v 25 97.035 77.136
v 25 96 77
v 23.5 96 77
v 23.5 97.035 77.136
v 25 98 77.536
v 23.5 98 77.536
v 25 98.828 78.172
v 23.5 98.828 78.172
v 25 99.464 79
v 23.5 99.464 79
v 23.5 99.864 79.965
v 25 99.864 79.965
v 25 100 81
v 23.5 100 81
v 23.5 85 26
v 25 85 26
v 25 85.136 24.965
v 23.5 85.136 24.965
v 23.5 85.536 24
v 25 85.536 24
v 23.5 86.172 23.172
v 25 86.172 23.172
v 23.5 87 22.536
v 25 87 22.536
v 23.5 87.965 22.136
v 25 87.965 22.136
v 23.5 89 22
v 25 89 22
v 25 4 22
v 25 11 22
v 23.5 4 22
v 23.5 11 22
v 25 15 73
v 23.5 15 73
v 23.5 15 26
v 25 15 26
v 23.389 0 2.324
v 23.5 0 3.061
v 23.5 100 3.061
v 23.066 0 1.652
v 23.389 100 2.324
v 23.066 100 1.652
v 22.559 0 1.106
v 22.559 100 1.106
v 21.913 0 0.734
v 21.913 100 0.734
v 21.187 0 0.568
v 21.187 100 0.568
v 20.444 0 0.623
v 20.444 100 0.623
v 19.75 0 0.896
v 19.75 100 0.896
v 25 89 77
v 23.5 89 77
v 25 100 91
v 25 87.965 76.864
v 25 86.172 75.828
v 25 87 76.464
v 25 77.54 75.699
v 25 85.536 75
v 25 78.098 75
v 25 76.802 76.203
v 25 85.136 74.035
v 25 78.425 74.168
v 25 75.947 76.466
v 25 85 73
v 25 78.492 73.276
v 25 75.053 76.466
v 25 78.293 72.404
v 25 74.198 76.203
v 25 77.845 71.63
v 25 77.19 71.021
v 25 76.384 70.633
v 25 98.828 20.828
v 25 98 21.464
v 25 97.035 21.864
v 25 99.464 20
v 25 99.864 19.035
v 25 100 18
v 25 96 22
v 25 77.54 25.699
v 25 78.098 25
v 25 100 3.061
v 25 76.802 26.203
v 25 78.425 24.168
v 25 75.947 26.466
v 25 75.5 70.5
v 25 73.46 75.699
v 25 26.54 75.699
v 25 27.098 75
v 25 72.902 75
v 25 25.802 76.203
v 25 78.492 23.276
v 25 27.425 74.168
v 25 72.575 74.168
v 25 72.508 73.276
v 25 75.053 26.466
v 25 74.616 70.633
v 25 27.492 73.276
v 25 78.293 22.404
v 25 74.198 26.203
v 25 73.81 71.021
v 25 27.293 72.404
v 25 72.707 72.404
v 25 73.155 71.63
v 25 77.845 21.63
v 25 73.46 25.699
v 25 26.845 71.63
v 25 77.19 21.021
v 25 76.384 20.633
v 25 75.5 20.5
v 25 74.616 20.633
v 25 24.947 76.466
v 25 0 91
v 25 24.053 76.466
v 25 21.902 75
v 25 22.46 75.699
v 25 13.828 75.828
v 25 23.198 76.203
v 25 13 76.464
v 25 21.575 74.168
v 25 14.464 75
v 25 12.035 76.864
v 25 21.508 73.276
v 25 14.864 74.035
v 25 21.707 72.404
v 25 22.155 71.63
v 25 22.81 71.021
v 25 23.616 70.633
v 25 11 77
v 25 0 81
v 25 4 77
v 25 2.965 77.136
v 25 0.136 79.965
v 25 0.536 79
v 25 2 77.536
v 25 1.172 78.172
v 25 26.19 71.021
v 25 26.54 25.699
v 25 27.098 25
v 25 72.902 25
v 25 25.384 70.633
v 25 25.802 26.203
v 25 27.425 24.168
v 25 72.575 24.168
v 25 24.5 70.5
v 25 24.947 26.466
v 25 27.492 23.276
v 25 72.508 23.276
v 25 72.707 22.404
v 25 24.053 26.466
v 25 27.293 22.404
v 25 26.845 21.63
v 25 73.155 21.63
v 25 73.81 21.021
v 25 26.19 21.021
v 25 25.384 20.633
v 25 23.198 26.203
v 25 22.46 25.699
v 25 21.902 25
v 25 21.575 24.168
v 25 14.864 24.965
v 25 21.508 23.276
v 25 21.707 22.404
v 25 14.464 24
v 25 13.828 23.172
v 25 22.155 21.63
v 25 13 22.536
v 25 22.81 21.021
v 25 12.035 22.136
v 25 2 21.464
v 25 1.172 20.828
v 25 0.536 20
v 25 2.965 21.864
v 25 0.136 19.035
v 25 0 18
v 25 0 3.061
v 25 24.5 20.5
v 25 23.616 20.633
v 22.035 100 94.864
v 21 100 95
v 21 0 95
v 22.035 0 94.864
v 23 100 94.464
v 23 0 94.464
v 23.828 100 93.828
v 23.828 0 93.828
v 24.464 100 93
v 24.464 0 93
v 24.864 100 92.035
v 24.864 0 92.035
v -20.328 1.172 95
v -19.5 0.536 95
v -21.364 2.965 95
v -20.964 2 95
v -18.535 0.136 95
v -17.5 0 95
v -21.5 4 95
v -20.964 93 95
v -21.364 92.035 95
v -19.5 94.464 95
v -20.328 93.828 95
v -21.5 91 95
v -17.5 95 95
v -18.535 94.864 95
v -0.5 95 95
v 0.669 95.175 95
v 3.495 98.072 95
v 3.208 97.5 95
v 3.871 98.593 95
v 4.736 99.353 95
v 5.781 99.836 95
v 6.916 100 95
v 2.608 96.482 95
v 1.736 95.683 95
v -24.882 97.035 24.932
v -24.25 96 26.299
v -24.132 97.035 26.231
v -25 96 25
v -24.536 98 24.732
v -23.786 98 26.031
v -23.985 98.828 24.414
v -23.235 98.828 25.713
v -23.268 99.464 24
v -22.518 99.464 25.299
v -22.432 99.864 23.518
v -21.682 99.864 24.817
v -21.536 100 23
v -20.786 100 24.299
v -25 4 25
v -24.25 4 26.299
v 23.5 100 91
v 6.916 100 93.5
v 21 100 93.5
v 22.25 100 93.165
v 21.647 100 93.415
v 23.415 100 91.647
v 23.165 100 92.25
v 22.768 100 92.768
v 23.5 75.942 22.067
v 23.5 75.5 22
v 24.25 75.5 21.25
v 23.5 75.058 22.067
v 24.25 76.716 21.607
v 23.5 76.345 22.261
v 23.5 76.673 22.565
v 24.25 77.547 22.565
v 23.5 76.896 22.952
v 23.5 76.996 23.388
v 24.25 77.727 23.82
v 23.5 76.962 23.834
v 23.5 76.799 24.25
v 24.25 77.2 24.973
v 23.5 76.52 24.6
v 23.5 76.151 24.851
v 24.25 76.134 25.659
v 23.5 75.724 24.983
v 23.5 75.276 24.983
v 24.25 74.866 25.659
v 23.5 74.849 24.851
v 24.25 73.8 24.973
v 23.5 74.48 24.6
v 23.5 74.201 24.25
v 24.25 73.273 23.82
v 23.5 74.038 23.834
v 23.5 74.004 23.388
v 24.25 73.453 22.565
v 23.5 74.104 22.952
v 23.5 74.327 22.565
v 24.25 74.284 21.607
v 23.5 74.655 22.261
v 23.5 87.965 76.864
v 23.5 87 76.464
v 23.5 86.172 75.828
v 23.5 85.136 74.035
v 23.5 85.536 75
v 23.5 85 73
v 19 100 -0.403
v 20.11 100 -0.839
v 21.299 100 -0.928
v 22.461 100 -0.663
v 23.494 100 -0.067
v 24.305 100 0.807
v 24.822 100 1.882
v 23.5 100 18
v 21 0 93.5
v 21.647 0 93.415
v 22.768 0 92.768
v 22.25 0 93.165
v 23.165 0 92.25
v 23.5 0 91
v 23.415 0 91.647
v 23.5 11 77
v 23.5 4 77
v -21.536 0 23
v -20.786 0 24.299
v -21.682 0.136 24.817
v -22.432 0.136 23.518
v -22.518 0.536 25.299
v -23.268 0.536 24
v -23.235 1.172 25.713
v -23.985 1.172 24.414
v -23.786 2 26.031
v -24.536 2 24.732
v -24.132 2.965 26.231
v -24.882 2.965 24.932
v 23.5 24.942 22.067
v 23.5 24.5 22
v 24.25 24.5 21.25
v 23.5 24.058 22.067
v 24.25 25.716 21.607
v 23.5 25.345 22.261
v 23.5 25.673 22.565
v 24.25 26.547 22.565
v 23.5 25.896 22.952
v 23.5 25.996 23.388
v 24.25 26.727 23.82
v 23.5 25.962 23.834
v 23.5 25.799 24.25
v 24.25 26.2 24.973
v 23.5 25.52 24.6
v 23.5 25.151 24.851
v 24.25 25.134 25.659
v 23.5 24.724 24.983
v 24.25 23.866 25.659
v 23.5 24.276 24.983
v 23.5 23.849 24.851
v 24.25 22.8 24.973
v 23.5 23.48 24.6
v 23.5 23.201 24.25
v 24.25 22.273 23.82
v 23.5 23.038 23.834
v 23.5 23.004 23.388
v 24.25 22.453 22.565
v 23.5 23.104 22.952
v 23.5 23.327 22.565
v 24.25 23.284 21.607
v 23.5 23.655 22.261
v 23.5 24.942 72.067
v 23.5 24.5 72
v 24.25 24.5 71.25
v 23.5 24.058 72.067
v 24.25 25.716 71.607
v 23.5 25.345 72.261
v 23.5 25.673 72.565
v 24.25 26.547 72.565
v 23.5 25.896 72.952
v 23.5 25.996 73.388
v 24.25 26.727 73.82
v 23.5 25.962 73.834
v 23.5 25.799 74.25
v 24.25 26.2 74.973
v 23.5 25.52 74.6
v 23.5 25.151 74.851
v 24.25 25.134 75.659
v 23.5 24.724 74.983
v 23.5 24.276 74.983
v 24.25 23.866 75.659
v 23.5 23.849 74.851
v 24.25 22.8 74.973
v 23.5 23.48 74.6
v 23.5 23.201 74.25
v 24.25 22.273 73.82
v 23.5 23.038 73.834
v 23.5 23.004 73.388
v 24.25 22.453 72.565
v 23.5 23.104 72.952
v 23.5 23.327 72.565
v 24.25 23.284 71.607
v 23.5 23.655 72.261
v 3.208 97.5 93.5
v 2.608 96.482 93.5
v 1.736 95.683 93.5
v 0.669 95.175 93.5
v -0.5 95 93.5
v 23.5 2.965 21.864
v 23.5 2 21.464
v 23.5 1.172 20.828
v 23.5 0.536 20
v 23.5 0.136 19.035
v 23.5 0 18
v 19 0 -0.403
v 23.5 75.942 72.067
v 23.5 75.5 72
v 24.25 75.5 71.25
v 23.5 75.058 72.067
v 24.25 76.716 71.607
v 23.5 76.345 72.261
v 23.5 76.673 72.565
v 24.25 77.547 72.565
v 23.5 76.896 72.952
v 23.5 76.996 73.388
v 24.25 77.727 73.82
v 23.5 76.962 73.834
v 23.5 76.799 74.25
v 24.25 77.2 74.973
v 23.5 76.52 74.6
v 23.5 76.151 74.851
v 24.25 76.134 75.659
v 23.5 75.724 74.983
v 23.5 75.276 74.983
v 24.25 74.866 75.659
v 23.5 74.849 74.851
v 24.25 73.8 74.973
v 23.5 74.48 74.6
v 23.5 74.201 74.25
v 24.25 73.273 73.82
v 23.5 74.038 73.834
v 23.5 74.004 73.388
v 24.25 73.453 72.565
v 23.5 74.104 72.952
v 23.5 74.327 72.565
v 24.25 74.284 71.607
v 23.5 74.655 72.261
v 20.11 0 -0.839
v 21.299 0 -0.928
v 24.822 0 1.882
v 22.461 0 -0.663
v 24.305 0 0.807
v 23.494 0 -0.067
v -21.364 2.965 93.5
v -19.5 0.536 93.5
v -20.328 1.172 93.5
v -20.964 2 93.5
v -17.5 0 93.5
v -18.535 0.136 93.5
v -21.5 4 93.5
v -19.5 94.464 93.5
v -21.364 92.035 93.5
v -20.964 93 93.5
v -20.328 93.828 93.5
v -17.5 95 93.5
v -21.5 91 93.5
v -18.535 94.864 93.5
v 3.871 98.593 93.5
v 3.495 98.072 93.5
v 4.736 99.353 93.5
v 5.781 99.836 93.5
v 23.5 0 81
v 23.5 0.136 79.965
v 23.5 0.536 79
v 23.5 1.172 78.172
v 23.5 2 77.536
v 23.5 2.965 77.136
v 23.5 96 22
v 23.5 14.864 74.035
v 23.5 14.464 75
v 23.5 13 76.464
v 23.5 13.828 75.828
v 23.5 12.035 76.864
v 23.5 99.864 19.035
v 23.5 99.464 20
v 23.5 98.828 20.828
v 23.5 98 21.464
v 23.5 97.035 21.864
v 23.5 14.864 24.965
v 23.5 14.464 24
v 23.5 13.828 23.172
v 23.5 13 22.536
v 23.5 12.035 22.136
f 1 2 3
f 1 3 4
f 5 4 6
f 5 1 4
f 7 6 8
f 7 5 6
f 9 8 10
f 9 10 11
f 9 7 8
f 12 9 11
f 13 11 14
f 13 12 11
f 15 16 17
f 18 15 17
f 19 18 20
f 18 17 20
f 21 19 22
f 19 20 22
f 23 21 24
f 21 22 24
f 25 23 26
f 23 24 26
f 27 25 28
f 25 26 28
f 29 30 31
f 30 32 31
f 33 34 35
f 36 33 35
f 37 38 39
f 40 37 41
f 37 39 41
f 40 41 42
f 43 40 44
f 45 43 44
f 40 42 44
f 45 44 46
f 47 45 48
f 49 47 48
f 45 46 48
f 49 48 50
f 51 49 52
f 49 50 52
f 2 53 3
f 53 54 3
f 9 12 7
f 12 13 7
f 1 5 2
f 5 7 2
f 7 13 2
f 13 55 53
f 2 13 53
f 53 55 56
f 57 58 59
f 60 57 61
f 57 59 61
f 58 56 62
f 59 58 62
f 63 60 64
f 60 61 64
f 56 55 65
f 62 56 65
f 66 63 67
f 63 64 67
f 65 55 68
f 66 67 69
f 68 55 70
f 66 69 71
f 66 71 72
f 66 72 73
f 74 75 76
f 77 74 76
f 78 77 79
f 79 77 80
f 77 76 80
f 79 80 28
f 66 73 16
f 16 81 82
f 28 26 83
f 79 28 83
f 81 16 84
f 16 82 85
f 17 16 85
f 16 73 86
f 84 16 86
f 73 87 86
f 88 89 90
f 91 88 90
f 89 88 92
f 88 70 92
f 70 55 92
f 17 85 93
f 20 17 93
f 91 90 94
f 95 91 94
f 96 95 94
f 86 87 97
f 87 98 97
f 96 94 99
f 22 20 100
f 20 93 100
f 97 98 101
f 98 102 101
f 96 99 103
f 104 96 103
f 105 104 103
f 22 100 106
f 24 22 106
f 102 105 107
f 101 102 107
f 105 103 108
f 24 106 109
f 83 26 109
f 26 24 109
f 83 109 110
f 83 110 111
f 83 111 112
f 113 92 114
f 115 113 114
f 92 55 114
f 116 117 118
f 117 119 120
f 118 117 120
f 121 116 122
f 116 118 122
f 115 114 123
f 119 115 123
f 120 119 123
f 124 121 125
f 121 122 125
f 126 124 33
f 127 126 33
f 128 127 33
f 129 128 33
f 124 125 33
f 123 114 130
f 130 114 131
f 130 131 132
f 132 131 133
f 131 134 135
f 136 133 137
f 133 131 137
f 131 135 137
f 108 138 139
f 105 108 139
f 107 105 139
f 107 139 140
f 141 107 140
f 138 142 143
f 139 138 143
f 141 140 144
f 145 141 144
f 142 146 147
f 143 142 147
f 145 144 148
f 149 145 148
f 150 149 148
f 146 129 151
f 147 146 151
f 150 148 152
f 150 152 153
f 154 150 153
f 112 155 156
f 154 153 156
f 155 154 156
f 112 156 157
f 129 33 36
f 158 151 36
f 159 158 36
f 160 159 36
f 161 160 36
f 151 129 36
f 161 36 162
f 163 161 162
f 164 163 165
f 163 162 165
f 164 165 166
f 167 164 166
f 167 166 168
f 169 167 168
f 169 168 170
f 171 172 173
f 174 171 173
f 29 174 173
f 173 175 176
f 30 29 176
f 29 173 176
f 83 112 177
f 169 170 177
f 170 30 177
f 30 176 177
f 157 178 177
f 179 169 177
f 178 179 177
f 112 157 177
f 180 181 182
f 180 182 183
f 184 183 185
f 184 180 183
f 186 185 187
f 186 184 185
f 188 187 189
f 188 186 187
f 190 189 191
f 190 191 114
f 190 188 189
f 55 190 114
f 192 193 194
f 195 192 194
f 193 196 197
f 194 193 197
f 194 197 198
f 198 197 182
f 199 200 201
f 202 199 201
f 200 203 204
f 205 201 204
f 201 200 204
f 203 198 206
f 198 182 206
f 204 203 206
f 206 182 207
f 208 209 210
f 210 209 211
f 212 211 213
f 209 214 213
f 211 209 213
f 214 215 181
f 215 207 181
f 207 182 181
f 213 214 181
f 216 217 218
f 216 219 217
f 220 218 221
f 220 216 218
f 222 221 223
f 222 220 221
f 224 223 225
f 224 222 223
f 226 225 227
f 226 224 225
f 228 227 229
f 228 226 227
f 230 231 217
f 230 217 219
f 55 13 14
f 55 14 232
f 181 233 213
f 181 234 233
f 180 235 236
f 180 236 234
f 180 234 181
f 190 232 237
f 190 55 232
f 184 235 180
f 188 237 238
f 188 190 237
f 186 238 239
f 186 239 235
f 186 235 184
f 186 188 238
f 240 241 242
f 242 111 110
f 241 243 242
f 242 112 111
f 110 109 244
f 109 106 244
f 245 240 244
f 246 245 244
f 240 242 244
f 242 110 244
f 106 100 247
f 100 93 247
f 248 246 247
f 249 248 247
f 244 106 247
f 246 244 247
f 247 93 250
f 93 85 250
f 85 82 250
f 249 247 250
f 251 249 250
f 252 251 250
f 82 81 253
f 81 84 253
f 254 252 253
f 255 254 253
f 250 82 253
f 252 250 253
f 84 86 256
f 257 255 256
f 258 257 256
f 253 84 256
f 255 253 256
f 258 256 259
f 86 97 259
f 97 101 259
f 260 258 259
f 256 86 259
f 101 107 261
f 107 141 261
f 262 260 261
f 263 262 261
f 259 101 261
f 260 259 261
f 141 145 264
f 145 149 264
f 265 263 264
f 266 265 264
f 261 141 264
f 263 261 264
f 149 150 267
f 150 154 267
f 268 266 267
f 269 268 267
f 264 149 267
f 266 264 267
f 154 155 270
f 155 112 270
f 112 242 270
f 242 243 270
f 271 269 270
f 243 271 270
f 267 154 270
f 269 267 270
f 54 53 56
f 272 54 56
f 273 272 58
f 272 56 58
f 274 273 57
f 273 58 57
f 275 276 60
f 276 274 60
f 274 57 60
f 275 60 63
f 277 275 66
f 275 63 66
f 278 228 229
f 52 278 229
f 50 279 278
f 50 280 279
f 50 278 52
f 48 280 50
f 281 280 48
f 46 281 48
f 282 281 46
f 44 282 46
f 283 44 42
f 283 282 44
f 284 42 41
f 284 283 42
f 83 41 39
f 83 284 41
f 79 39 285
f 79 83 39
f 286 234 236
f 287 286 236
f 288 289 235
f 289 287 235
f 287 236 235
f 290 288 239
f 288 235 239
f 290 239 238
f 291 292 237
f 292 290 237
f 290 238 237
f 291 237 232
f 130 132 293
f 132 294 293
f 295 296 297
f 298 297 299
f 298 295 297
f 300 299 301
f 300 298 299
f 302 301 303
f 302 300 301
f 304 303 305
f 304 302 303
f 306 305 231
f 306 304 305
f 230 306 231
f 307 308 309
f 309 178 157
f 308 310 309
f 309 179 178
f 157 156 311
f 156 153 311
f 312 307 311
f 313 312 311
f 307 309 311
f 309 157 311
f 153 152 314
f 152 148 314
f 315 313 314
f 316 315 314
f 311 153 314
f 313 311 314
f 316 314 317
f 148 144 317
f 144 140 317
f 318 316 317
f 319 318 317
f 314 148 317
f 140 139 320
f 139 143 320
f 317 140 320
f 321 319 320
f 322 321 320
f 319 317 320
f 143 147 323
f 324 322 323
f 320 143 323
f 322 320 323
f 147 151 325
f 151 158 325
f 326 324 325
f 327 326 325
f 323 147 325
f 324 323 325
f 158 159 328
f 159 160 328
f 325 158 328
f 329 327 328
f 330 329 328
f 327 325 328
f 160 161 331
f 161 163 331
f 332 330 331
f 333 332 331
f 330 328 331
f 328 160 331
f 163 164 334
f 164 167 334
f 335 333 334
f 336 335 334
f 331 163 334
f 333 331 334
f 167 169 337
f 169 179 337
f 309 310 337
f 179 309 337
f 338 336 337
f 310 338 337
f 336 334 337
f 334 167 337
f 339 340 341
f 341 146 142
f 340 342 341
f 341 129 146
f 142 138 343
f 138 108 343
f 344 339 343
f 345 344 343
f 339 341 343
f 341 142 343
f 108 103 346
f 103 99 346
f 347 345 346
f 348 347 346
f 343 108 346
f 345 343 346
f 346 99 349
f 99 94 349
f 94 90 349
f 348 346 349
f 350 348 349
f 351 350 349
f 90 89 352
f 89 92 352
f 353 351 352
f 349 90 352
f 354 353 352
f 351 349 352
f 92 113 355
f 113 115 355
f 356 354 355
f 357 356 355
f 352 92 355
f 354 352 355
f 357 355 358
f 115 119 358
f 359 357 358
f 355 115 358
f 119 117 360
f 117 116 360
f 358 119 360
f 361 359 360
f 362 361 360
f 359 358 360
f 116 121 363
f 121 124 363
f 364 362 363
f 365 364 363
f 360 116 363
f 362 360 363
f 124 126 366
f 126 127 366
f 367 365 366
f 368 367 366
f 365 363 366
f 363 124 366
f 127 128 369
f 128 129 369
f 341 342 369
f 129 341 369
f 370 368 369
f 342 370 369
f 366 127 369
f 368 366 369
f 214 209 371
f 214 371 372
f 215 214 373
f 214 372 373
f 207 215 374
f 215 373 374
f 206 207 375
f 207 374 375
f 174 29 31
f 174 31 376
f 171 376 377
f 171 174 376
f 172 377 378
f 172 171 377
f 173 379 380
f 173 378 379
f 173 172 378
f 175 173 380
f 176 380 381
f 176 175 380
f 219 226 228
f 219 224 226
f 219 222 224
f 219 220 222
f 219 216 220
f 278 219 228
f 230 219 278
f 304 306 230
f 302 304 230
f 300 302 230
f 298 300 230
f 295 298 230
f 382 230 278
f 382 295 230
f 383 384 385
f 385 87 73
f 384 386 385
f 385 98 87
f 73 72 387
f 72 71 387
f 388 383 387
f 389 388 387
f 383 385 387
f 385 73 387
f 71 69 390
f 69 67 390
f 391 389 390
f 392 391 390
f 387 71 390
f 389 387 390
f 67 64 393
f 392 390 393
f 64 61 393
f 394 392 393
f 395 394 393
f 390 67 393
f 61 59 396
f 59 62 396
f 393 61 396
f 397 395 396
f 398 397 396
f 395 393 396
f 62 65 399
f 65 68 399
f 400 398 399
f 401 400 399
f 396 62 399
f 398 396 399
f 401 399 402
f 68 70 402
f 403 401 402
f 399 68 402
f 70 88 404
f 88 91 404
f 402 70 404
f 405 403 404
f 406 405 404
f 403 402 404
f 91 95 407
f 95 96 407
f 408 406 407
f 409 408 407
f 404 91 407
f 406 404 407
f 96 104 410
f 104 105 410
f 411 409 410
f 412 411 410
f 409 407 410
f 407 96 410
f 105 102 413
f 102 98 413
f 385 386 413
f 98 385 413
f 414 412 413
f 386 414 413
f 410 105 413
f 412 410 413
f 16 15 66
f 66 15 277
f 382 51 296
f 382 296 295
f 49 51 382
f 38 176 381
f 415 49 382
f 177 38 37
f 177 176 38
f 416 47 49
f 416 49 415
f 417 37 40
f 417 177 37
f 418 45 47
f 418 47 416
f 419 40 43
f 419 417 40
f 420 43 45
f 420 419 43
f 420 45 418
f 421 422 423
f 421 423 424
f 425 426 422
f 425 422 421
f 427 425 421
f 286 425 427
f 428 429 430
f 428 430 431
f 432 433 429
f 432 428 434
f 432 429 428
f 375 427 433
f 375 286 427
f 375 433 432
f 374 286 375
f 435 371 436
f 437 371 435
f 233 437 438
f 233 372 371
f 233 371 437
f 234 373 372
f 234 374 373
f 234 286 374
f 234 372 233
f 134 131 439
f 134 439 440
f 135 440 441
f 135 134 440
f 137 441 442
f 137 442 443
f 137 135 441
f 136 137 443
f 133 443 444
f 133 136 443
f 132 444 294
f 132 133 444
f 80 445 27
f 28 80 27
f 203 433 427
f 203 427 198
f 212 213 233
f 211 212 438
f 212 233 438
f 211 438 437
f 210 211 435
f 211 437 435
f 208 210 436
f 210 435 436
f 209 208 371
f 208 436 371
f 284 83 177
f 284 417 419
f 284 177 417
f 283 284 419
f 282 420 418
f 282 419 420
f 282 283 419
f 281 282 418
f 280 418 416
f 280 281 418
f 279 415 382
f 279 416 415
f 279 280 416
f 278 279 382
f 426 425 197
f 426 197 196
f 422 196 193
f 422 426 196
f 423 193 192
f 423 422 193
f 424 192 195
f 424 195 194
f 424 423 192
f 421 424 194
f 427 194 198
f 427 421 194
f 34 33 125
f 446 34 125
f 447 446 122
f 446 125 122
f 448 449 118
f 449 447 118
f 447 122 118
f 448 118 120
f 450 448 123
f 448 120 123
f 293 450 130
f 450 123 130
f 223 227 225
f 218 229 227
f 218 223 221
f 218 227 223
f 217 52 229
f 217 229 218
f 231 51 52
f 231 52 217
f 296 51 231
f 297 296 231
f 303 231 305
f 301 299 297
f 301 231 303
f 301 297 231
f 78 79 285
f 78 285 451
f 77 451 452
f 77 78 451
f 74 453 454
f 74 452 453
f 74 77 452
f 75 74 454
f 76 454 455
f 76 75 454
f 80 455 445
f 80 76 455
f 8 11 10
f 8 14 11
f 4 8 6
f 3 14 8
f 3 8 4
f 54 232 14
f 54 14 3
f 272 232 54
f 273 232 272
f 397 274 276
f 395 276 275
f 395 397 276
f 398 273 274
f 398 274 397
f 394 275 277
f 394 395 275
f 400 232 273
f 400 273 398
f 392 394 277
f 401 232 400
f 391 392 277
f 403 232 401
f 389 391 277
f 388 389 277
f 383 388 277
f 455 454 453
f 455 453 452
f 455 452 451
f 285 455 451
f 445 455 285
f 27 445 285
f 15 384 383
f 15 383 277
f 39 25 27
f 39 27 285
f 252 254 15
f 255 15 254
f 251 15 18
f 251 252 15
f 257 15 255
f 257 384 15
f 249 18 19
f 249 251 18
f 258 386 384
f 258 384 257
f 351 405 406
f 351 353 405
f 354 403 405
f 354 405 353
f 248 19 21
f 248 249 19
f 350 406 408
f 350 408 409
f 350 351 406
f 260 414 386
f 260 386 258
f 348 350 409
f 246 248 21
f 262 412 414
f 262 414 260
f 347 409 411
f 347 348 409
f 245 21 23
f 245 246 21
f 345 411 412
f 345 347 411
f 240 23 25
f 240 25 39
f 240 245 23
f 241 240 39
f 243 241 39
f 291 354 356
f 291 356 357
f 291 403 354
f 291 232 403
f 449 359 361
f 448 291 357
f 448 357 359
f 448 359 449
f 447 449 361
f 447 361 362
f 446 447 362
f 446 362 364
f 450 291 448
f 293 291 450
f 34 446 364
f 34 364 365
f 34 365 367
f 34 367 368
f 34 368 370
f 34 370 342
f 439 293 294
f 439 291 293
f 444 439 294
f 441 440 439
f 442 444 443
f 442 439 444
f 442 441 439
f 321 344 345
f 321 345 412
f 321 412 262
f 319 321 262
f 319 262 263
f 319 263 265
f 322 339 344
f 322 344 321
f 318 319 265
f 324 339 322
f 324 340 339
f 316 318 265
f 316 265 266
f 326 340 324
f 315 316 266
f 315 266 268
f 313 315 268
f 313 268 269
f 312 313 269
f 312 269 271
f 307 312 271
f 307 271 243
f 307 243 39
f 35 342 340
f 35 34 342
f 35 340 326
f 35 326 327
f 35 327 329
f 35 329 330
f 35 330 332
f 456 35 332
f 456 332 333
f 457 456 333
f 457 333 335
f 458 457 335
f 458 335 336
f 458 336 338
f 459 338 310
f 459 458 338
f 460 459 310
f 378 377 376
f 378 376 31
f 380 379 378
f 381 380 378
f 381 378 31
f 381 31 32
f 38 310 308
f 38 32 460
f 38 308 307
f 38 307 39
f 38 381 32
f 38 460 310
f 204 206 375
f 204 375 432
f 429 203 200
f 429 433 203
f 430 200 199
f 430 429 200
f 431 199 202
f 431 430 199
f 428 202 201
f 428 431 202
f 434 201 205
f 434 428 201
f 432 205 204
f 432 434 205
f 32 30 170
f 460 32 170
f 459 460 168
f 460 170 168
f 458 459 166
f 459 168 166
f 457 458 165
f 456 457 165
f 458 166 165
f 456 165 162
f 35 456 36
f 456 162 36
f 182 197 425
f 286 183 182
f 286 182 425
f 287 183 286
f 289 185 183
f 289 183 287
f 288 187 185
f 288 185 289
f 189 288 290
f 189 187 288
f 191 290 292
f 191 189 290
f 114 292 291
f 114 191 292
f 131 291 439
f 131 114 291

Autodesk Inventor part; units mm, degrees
ref_plane "YZ Plane" through (0, 0, 0) normal (1, 0, 0) x (0, 1, 0)
ref_plane "XZ Plane" through (0, 0, 0) normal (0, 1, 0) x (-1, 0, 0)
ref_plane "XY Plane" through (0, 0, 0) normal (0, 0, 1) x (1, 0, 0)
sketch "Sketch2" plane through (0, 0, 0) normal (0, 1, 0) x (-1, 0, 0)
  line L0 (-23.5, 25.6213) -> (-23.5, 95)
  line L1 (-23.5, 95) -> (-25, 95)
  line L2 (-25, 95) -> (-25, 25)
  line L3 (-25, 25) -> (0, 0)
  line L4 (0, 0) -> (25, 25)
  line L5 (23.5, 25.6213) -> (0, 2.1213)
  line L6 (0, 2.1213) -> (-23.5, 25.6213)
  line L7 (23.5, 25.6213) -> (25, 25)
  line L8 (25, 25) -> (-25, -3.8675)
  line L9 (-25, -3.8675) -> (-25, 25)
  line L10 (-23.5, 25.6213) -> (-23.5, -1.2694)
  line L11 (-23.5, -1.2694) -> (24.25, 26.299)
  line L12 (24.25, 26.299) -> (25, 25)
  point P0 (24.5092, 24.5092)
  dimension "d11" = 1.5
  dimension "d18" = 1.5
  dimension "d19" = 1.5
  dimension "d27" = 70
  dimension "d28" = 50
  dimension "d29" = 135
  dimension "d47" = 60
  dimension "d48" = 1.5
extrude "Extrusion2" add sketch "Sketch2" along normal blind 100 contours L10 L3 L2 L1 L0 | L11 L12 L7 L5 L8 L6 | L6 L8 L3 L11 | L10 L11 L3 L8 L9 | L5 L7 L8
fillet "Fillet3" radius 2.5 1 edges at (23.5, 50, -1.2694)
sketch "Sketch7" plane through (23.5, 0, 95) normal (-1, 0, 0) x (0, 0, 1)
  line L0 (0, 0) -> (0, 100) projected
  line L1 (0, 0) -> (-1.5, 0)
  line L2 (-1.5, 0) -> (-1.5, 100)
  line L3 (-1.5, 100) -> (0, 100)
  line L4 (0, 100) -> (0, 0)
  line L5 (-91.9393, 100) -> (0, 100) projected
  point P0 (-95, 0)
  dimension "d49" = 1.5
extrude "Extrusion7" add sketch "Sketch7" along normal blind 45
fillet "Fillet12" radius 4 2 edges at (25, 50, 95) (25, 50, -3.8675)
fillet "Fillet13" radius 2.5 1 edges at (23.5, 50, 93.5)
sketch "Sketch8" plane through (23.5, 0, 3.0607) normal (-1, 0, 0) x (0, 0, 1)
  line L0 (18.9393, 0) -> (73.9393, 0)
  line L1 (73.9393, 0) -> (73.9393, 15)
  line L2 (73.9393, 15) -> (18.9393, 15)
  line L3 (18.9393, 15) -> (18.9393, 0)
  line L4 (18.9393, 85) -> (73.9393, 85)
  line L5 (73.9393, 85) -> (73.9393, 100)
  line L6 (73.9393, 100) -> (18.9393, 100)
  line L7 (18.9393, 100) -> (18.9393, 85)
  line L8 (0, 100) -> (87.9393, 100) projected
  line L9 (0, 0) -> (87.9393, 0) projected
  line L10 (91.9393, 0) -> (91.9393, 100) projected
  point P0 (-3.0607, 0)
  dimension "d54" = 15
  dimension "d55" = 55
  dimension "d58" = 18
extrude "Extrusion8" cut sketch "Sketch8" against normal through all
sketch "Sketch9" plane through (-21.5, 0, 95) normal (0, 0, 1) x (1, 0, 0)
  line L0 (0, 100) -> (0, 0) projected
  line L1 (0, 100) -> (25, 100)
  line L2 (25, 100) -> (25, 95)
  line L3 (25, 95) -> (0, 95)
  line L4 (0, 95) -> (0, 100)
  point P0 (21.5, 0)
  dimension "d60" = 5
  dimension "d61" = 25
extrude "Extrusion9" cut sketch "Sketch9" against normal blind 35
fillet "Fillet14" radius 4 14 edges at (24.25, 85, 77) (24.25, 85, 22) (24.25, 100, 22) (24.25, 100, 77) (24.25, 15, 22) (24.25, 0, 22) (24.25, 15, 77) (24.25, 0, 77) (-21.5, 95, 94.25) (3.5, 95, 94.25) (3.5, 100, 94.25) (-21.5, 0, 94.25) (-24.625, 0, 25.6495) (-24.625, 100, 25.6495)
sketch "Sketch10" plane through (25, 0, 3.0607) normal (1, 0, 0) x (0, 0, -1)
  circle A0 centre (-70.4393, 75.5) radius 1.5
  circle A1 centre (-20.4393, 75.5) radius 1.5
  circle A2 centre (-70.4393, 24.5) radius 1.5
  circle A3 centre (-20.4393, 24.5) radius 1.5
  line L0 (-91.9393, 100) -> (-91.9393, 0) projected
  line L1 (-91.9393, 4) -> (-91.9393, 91) projected
  line L2 (-87.9393, 100) -> (-77.9393, 100) projected
  point P0 (3.0607, 0)
  dimension "d64" = 3
  dimension "d65" = 50
  dimension "d66" = 51
  dimension "d70" = 24.5
  dimension "d71" = 21.5
extrude "Extrusion10" cut sketch "Sketch10" against normal blind 5
chamfer "Chamfer1" distance 1.5 angle 45 4 edges at (25, 75.5, 75) (25, 75.5, 25) (25, 24.5, 25) (25, 24.5, 75)
properties part number "armor"
